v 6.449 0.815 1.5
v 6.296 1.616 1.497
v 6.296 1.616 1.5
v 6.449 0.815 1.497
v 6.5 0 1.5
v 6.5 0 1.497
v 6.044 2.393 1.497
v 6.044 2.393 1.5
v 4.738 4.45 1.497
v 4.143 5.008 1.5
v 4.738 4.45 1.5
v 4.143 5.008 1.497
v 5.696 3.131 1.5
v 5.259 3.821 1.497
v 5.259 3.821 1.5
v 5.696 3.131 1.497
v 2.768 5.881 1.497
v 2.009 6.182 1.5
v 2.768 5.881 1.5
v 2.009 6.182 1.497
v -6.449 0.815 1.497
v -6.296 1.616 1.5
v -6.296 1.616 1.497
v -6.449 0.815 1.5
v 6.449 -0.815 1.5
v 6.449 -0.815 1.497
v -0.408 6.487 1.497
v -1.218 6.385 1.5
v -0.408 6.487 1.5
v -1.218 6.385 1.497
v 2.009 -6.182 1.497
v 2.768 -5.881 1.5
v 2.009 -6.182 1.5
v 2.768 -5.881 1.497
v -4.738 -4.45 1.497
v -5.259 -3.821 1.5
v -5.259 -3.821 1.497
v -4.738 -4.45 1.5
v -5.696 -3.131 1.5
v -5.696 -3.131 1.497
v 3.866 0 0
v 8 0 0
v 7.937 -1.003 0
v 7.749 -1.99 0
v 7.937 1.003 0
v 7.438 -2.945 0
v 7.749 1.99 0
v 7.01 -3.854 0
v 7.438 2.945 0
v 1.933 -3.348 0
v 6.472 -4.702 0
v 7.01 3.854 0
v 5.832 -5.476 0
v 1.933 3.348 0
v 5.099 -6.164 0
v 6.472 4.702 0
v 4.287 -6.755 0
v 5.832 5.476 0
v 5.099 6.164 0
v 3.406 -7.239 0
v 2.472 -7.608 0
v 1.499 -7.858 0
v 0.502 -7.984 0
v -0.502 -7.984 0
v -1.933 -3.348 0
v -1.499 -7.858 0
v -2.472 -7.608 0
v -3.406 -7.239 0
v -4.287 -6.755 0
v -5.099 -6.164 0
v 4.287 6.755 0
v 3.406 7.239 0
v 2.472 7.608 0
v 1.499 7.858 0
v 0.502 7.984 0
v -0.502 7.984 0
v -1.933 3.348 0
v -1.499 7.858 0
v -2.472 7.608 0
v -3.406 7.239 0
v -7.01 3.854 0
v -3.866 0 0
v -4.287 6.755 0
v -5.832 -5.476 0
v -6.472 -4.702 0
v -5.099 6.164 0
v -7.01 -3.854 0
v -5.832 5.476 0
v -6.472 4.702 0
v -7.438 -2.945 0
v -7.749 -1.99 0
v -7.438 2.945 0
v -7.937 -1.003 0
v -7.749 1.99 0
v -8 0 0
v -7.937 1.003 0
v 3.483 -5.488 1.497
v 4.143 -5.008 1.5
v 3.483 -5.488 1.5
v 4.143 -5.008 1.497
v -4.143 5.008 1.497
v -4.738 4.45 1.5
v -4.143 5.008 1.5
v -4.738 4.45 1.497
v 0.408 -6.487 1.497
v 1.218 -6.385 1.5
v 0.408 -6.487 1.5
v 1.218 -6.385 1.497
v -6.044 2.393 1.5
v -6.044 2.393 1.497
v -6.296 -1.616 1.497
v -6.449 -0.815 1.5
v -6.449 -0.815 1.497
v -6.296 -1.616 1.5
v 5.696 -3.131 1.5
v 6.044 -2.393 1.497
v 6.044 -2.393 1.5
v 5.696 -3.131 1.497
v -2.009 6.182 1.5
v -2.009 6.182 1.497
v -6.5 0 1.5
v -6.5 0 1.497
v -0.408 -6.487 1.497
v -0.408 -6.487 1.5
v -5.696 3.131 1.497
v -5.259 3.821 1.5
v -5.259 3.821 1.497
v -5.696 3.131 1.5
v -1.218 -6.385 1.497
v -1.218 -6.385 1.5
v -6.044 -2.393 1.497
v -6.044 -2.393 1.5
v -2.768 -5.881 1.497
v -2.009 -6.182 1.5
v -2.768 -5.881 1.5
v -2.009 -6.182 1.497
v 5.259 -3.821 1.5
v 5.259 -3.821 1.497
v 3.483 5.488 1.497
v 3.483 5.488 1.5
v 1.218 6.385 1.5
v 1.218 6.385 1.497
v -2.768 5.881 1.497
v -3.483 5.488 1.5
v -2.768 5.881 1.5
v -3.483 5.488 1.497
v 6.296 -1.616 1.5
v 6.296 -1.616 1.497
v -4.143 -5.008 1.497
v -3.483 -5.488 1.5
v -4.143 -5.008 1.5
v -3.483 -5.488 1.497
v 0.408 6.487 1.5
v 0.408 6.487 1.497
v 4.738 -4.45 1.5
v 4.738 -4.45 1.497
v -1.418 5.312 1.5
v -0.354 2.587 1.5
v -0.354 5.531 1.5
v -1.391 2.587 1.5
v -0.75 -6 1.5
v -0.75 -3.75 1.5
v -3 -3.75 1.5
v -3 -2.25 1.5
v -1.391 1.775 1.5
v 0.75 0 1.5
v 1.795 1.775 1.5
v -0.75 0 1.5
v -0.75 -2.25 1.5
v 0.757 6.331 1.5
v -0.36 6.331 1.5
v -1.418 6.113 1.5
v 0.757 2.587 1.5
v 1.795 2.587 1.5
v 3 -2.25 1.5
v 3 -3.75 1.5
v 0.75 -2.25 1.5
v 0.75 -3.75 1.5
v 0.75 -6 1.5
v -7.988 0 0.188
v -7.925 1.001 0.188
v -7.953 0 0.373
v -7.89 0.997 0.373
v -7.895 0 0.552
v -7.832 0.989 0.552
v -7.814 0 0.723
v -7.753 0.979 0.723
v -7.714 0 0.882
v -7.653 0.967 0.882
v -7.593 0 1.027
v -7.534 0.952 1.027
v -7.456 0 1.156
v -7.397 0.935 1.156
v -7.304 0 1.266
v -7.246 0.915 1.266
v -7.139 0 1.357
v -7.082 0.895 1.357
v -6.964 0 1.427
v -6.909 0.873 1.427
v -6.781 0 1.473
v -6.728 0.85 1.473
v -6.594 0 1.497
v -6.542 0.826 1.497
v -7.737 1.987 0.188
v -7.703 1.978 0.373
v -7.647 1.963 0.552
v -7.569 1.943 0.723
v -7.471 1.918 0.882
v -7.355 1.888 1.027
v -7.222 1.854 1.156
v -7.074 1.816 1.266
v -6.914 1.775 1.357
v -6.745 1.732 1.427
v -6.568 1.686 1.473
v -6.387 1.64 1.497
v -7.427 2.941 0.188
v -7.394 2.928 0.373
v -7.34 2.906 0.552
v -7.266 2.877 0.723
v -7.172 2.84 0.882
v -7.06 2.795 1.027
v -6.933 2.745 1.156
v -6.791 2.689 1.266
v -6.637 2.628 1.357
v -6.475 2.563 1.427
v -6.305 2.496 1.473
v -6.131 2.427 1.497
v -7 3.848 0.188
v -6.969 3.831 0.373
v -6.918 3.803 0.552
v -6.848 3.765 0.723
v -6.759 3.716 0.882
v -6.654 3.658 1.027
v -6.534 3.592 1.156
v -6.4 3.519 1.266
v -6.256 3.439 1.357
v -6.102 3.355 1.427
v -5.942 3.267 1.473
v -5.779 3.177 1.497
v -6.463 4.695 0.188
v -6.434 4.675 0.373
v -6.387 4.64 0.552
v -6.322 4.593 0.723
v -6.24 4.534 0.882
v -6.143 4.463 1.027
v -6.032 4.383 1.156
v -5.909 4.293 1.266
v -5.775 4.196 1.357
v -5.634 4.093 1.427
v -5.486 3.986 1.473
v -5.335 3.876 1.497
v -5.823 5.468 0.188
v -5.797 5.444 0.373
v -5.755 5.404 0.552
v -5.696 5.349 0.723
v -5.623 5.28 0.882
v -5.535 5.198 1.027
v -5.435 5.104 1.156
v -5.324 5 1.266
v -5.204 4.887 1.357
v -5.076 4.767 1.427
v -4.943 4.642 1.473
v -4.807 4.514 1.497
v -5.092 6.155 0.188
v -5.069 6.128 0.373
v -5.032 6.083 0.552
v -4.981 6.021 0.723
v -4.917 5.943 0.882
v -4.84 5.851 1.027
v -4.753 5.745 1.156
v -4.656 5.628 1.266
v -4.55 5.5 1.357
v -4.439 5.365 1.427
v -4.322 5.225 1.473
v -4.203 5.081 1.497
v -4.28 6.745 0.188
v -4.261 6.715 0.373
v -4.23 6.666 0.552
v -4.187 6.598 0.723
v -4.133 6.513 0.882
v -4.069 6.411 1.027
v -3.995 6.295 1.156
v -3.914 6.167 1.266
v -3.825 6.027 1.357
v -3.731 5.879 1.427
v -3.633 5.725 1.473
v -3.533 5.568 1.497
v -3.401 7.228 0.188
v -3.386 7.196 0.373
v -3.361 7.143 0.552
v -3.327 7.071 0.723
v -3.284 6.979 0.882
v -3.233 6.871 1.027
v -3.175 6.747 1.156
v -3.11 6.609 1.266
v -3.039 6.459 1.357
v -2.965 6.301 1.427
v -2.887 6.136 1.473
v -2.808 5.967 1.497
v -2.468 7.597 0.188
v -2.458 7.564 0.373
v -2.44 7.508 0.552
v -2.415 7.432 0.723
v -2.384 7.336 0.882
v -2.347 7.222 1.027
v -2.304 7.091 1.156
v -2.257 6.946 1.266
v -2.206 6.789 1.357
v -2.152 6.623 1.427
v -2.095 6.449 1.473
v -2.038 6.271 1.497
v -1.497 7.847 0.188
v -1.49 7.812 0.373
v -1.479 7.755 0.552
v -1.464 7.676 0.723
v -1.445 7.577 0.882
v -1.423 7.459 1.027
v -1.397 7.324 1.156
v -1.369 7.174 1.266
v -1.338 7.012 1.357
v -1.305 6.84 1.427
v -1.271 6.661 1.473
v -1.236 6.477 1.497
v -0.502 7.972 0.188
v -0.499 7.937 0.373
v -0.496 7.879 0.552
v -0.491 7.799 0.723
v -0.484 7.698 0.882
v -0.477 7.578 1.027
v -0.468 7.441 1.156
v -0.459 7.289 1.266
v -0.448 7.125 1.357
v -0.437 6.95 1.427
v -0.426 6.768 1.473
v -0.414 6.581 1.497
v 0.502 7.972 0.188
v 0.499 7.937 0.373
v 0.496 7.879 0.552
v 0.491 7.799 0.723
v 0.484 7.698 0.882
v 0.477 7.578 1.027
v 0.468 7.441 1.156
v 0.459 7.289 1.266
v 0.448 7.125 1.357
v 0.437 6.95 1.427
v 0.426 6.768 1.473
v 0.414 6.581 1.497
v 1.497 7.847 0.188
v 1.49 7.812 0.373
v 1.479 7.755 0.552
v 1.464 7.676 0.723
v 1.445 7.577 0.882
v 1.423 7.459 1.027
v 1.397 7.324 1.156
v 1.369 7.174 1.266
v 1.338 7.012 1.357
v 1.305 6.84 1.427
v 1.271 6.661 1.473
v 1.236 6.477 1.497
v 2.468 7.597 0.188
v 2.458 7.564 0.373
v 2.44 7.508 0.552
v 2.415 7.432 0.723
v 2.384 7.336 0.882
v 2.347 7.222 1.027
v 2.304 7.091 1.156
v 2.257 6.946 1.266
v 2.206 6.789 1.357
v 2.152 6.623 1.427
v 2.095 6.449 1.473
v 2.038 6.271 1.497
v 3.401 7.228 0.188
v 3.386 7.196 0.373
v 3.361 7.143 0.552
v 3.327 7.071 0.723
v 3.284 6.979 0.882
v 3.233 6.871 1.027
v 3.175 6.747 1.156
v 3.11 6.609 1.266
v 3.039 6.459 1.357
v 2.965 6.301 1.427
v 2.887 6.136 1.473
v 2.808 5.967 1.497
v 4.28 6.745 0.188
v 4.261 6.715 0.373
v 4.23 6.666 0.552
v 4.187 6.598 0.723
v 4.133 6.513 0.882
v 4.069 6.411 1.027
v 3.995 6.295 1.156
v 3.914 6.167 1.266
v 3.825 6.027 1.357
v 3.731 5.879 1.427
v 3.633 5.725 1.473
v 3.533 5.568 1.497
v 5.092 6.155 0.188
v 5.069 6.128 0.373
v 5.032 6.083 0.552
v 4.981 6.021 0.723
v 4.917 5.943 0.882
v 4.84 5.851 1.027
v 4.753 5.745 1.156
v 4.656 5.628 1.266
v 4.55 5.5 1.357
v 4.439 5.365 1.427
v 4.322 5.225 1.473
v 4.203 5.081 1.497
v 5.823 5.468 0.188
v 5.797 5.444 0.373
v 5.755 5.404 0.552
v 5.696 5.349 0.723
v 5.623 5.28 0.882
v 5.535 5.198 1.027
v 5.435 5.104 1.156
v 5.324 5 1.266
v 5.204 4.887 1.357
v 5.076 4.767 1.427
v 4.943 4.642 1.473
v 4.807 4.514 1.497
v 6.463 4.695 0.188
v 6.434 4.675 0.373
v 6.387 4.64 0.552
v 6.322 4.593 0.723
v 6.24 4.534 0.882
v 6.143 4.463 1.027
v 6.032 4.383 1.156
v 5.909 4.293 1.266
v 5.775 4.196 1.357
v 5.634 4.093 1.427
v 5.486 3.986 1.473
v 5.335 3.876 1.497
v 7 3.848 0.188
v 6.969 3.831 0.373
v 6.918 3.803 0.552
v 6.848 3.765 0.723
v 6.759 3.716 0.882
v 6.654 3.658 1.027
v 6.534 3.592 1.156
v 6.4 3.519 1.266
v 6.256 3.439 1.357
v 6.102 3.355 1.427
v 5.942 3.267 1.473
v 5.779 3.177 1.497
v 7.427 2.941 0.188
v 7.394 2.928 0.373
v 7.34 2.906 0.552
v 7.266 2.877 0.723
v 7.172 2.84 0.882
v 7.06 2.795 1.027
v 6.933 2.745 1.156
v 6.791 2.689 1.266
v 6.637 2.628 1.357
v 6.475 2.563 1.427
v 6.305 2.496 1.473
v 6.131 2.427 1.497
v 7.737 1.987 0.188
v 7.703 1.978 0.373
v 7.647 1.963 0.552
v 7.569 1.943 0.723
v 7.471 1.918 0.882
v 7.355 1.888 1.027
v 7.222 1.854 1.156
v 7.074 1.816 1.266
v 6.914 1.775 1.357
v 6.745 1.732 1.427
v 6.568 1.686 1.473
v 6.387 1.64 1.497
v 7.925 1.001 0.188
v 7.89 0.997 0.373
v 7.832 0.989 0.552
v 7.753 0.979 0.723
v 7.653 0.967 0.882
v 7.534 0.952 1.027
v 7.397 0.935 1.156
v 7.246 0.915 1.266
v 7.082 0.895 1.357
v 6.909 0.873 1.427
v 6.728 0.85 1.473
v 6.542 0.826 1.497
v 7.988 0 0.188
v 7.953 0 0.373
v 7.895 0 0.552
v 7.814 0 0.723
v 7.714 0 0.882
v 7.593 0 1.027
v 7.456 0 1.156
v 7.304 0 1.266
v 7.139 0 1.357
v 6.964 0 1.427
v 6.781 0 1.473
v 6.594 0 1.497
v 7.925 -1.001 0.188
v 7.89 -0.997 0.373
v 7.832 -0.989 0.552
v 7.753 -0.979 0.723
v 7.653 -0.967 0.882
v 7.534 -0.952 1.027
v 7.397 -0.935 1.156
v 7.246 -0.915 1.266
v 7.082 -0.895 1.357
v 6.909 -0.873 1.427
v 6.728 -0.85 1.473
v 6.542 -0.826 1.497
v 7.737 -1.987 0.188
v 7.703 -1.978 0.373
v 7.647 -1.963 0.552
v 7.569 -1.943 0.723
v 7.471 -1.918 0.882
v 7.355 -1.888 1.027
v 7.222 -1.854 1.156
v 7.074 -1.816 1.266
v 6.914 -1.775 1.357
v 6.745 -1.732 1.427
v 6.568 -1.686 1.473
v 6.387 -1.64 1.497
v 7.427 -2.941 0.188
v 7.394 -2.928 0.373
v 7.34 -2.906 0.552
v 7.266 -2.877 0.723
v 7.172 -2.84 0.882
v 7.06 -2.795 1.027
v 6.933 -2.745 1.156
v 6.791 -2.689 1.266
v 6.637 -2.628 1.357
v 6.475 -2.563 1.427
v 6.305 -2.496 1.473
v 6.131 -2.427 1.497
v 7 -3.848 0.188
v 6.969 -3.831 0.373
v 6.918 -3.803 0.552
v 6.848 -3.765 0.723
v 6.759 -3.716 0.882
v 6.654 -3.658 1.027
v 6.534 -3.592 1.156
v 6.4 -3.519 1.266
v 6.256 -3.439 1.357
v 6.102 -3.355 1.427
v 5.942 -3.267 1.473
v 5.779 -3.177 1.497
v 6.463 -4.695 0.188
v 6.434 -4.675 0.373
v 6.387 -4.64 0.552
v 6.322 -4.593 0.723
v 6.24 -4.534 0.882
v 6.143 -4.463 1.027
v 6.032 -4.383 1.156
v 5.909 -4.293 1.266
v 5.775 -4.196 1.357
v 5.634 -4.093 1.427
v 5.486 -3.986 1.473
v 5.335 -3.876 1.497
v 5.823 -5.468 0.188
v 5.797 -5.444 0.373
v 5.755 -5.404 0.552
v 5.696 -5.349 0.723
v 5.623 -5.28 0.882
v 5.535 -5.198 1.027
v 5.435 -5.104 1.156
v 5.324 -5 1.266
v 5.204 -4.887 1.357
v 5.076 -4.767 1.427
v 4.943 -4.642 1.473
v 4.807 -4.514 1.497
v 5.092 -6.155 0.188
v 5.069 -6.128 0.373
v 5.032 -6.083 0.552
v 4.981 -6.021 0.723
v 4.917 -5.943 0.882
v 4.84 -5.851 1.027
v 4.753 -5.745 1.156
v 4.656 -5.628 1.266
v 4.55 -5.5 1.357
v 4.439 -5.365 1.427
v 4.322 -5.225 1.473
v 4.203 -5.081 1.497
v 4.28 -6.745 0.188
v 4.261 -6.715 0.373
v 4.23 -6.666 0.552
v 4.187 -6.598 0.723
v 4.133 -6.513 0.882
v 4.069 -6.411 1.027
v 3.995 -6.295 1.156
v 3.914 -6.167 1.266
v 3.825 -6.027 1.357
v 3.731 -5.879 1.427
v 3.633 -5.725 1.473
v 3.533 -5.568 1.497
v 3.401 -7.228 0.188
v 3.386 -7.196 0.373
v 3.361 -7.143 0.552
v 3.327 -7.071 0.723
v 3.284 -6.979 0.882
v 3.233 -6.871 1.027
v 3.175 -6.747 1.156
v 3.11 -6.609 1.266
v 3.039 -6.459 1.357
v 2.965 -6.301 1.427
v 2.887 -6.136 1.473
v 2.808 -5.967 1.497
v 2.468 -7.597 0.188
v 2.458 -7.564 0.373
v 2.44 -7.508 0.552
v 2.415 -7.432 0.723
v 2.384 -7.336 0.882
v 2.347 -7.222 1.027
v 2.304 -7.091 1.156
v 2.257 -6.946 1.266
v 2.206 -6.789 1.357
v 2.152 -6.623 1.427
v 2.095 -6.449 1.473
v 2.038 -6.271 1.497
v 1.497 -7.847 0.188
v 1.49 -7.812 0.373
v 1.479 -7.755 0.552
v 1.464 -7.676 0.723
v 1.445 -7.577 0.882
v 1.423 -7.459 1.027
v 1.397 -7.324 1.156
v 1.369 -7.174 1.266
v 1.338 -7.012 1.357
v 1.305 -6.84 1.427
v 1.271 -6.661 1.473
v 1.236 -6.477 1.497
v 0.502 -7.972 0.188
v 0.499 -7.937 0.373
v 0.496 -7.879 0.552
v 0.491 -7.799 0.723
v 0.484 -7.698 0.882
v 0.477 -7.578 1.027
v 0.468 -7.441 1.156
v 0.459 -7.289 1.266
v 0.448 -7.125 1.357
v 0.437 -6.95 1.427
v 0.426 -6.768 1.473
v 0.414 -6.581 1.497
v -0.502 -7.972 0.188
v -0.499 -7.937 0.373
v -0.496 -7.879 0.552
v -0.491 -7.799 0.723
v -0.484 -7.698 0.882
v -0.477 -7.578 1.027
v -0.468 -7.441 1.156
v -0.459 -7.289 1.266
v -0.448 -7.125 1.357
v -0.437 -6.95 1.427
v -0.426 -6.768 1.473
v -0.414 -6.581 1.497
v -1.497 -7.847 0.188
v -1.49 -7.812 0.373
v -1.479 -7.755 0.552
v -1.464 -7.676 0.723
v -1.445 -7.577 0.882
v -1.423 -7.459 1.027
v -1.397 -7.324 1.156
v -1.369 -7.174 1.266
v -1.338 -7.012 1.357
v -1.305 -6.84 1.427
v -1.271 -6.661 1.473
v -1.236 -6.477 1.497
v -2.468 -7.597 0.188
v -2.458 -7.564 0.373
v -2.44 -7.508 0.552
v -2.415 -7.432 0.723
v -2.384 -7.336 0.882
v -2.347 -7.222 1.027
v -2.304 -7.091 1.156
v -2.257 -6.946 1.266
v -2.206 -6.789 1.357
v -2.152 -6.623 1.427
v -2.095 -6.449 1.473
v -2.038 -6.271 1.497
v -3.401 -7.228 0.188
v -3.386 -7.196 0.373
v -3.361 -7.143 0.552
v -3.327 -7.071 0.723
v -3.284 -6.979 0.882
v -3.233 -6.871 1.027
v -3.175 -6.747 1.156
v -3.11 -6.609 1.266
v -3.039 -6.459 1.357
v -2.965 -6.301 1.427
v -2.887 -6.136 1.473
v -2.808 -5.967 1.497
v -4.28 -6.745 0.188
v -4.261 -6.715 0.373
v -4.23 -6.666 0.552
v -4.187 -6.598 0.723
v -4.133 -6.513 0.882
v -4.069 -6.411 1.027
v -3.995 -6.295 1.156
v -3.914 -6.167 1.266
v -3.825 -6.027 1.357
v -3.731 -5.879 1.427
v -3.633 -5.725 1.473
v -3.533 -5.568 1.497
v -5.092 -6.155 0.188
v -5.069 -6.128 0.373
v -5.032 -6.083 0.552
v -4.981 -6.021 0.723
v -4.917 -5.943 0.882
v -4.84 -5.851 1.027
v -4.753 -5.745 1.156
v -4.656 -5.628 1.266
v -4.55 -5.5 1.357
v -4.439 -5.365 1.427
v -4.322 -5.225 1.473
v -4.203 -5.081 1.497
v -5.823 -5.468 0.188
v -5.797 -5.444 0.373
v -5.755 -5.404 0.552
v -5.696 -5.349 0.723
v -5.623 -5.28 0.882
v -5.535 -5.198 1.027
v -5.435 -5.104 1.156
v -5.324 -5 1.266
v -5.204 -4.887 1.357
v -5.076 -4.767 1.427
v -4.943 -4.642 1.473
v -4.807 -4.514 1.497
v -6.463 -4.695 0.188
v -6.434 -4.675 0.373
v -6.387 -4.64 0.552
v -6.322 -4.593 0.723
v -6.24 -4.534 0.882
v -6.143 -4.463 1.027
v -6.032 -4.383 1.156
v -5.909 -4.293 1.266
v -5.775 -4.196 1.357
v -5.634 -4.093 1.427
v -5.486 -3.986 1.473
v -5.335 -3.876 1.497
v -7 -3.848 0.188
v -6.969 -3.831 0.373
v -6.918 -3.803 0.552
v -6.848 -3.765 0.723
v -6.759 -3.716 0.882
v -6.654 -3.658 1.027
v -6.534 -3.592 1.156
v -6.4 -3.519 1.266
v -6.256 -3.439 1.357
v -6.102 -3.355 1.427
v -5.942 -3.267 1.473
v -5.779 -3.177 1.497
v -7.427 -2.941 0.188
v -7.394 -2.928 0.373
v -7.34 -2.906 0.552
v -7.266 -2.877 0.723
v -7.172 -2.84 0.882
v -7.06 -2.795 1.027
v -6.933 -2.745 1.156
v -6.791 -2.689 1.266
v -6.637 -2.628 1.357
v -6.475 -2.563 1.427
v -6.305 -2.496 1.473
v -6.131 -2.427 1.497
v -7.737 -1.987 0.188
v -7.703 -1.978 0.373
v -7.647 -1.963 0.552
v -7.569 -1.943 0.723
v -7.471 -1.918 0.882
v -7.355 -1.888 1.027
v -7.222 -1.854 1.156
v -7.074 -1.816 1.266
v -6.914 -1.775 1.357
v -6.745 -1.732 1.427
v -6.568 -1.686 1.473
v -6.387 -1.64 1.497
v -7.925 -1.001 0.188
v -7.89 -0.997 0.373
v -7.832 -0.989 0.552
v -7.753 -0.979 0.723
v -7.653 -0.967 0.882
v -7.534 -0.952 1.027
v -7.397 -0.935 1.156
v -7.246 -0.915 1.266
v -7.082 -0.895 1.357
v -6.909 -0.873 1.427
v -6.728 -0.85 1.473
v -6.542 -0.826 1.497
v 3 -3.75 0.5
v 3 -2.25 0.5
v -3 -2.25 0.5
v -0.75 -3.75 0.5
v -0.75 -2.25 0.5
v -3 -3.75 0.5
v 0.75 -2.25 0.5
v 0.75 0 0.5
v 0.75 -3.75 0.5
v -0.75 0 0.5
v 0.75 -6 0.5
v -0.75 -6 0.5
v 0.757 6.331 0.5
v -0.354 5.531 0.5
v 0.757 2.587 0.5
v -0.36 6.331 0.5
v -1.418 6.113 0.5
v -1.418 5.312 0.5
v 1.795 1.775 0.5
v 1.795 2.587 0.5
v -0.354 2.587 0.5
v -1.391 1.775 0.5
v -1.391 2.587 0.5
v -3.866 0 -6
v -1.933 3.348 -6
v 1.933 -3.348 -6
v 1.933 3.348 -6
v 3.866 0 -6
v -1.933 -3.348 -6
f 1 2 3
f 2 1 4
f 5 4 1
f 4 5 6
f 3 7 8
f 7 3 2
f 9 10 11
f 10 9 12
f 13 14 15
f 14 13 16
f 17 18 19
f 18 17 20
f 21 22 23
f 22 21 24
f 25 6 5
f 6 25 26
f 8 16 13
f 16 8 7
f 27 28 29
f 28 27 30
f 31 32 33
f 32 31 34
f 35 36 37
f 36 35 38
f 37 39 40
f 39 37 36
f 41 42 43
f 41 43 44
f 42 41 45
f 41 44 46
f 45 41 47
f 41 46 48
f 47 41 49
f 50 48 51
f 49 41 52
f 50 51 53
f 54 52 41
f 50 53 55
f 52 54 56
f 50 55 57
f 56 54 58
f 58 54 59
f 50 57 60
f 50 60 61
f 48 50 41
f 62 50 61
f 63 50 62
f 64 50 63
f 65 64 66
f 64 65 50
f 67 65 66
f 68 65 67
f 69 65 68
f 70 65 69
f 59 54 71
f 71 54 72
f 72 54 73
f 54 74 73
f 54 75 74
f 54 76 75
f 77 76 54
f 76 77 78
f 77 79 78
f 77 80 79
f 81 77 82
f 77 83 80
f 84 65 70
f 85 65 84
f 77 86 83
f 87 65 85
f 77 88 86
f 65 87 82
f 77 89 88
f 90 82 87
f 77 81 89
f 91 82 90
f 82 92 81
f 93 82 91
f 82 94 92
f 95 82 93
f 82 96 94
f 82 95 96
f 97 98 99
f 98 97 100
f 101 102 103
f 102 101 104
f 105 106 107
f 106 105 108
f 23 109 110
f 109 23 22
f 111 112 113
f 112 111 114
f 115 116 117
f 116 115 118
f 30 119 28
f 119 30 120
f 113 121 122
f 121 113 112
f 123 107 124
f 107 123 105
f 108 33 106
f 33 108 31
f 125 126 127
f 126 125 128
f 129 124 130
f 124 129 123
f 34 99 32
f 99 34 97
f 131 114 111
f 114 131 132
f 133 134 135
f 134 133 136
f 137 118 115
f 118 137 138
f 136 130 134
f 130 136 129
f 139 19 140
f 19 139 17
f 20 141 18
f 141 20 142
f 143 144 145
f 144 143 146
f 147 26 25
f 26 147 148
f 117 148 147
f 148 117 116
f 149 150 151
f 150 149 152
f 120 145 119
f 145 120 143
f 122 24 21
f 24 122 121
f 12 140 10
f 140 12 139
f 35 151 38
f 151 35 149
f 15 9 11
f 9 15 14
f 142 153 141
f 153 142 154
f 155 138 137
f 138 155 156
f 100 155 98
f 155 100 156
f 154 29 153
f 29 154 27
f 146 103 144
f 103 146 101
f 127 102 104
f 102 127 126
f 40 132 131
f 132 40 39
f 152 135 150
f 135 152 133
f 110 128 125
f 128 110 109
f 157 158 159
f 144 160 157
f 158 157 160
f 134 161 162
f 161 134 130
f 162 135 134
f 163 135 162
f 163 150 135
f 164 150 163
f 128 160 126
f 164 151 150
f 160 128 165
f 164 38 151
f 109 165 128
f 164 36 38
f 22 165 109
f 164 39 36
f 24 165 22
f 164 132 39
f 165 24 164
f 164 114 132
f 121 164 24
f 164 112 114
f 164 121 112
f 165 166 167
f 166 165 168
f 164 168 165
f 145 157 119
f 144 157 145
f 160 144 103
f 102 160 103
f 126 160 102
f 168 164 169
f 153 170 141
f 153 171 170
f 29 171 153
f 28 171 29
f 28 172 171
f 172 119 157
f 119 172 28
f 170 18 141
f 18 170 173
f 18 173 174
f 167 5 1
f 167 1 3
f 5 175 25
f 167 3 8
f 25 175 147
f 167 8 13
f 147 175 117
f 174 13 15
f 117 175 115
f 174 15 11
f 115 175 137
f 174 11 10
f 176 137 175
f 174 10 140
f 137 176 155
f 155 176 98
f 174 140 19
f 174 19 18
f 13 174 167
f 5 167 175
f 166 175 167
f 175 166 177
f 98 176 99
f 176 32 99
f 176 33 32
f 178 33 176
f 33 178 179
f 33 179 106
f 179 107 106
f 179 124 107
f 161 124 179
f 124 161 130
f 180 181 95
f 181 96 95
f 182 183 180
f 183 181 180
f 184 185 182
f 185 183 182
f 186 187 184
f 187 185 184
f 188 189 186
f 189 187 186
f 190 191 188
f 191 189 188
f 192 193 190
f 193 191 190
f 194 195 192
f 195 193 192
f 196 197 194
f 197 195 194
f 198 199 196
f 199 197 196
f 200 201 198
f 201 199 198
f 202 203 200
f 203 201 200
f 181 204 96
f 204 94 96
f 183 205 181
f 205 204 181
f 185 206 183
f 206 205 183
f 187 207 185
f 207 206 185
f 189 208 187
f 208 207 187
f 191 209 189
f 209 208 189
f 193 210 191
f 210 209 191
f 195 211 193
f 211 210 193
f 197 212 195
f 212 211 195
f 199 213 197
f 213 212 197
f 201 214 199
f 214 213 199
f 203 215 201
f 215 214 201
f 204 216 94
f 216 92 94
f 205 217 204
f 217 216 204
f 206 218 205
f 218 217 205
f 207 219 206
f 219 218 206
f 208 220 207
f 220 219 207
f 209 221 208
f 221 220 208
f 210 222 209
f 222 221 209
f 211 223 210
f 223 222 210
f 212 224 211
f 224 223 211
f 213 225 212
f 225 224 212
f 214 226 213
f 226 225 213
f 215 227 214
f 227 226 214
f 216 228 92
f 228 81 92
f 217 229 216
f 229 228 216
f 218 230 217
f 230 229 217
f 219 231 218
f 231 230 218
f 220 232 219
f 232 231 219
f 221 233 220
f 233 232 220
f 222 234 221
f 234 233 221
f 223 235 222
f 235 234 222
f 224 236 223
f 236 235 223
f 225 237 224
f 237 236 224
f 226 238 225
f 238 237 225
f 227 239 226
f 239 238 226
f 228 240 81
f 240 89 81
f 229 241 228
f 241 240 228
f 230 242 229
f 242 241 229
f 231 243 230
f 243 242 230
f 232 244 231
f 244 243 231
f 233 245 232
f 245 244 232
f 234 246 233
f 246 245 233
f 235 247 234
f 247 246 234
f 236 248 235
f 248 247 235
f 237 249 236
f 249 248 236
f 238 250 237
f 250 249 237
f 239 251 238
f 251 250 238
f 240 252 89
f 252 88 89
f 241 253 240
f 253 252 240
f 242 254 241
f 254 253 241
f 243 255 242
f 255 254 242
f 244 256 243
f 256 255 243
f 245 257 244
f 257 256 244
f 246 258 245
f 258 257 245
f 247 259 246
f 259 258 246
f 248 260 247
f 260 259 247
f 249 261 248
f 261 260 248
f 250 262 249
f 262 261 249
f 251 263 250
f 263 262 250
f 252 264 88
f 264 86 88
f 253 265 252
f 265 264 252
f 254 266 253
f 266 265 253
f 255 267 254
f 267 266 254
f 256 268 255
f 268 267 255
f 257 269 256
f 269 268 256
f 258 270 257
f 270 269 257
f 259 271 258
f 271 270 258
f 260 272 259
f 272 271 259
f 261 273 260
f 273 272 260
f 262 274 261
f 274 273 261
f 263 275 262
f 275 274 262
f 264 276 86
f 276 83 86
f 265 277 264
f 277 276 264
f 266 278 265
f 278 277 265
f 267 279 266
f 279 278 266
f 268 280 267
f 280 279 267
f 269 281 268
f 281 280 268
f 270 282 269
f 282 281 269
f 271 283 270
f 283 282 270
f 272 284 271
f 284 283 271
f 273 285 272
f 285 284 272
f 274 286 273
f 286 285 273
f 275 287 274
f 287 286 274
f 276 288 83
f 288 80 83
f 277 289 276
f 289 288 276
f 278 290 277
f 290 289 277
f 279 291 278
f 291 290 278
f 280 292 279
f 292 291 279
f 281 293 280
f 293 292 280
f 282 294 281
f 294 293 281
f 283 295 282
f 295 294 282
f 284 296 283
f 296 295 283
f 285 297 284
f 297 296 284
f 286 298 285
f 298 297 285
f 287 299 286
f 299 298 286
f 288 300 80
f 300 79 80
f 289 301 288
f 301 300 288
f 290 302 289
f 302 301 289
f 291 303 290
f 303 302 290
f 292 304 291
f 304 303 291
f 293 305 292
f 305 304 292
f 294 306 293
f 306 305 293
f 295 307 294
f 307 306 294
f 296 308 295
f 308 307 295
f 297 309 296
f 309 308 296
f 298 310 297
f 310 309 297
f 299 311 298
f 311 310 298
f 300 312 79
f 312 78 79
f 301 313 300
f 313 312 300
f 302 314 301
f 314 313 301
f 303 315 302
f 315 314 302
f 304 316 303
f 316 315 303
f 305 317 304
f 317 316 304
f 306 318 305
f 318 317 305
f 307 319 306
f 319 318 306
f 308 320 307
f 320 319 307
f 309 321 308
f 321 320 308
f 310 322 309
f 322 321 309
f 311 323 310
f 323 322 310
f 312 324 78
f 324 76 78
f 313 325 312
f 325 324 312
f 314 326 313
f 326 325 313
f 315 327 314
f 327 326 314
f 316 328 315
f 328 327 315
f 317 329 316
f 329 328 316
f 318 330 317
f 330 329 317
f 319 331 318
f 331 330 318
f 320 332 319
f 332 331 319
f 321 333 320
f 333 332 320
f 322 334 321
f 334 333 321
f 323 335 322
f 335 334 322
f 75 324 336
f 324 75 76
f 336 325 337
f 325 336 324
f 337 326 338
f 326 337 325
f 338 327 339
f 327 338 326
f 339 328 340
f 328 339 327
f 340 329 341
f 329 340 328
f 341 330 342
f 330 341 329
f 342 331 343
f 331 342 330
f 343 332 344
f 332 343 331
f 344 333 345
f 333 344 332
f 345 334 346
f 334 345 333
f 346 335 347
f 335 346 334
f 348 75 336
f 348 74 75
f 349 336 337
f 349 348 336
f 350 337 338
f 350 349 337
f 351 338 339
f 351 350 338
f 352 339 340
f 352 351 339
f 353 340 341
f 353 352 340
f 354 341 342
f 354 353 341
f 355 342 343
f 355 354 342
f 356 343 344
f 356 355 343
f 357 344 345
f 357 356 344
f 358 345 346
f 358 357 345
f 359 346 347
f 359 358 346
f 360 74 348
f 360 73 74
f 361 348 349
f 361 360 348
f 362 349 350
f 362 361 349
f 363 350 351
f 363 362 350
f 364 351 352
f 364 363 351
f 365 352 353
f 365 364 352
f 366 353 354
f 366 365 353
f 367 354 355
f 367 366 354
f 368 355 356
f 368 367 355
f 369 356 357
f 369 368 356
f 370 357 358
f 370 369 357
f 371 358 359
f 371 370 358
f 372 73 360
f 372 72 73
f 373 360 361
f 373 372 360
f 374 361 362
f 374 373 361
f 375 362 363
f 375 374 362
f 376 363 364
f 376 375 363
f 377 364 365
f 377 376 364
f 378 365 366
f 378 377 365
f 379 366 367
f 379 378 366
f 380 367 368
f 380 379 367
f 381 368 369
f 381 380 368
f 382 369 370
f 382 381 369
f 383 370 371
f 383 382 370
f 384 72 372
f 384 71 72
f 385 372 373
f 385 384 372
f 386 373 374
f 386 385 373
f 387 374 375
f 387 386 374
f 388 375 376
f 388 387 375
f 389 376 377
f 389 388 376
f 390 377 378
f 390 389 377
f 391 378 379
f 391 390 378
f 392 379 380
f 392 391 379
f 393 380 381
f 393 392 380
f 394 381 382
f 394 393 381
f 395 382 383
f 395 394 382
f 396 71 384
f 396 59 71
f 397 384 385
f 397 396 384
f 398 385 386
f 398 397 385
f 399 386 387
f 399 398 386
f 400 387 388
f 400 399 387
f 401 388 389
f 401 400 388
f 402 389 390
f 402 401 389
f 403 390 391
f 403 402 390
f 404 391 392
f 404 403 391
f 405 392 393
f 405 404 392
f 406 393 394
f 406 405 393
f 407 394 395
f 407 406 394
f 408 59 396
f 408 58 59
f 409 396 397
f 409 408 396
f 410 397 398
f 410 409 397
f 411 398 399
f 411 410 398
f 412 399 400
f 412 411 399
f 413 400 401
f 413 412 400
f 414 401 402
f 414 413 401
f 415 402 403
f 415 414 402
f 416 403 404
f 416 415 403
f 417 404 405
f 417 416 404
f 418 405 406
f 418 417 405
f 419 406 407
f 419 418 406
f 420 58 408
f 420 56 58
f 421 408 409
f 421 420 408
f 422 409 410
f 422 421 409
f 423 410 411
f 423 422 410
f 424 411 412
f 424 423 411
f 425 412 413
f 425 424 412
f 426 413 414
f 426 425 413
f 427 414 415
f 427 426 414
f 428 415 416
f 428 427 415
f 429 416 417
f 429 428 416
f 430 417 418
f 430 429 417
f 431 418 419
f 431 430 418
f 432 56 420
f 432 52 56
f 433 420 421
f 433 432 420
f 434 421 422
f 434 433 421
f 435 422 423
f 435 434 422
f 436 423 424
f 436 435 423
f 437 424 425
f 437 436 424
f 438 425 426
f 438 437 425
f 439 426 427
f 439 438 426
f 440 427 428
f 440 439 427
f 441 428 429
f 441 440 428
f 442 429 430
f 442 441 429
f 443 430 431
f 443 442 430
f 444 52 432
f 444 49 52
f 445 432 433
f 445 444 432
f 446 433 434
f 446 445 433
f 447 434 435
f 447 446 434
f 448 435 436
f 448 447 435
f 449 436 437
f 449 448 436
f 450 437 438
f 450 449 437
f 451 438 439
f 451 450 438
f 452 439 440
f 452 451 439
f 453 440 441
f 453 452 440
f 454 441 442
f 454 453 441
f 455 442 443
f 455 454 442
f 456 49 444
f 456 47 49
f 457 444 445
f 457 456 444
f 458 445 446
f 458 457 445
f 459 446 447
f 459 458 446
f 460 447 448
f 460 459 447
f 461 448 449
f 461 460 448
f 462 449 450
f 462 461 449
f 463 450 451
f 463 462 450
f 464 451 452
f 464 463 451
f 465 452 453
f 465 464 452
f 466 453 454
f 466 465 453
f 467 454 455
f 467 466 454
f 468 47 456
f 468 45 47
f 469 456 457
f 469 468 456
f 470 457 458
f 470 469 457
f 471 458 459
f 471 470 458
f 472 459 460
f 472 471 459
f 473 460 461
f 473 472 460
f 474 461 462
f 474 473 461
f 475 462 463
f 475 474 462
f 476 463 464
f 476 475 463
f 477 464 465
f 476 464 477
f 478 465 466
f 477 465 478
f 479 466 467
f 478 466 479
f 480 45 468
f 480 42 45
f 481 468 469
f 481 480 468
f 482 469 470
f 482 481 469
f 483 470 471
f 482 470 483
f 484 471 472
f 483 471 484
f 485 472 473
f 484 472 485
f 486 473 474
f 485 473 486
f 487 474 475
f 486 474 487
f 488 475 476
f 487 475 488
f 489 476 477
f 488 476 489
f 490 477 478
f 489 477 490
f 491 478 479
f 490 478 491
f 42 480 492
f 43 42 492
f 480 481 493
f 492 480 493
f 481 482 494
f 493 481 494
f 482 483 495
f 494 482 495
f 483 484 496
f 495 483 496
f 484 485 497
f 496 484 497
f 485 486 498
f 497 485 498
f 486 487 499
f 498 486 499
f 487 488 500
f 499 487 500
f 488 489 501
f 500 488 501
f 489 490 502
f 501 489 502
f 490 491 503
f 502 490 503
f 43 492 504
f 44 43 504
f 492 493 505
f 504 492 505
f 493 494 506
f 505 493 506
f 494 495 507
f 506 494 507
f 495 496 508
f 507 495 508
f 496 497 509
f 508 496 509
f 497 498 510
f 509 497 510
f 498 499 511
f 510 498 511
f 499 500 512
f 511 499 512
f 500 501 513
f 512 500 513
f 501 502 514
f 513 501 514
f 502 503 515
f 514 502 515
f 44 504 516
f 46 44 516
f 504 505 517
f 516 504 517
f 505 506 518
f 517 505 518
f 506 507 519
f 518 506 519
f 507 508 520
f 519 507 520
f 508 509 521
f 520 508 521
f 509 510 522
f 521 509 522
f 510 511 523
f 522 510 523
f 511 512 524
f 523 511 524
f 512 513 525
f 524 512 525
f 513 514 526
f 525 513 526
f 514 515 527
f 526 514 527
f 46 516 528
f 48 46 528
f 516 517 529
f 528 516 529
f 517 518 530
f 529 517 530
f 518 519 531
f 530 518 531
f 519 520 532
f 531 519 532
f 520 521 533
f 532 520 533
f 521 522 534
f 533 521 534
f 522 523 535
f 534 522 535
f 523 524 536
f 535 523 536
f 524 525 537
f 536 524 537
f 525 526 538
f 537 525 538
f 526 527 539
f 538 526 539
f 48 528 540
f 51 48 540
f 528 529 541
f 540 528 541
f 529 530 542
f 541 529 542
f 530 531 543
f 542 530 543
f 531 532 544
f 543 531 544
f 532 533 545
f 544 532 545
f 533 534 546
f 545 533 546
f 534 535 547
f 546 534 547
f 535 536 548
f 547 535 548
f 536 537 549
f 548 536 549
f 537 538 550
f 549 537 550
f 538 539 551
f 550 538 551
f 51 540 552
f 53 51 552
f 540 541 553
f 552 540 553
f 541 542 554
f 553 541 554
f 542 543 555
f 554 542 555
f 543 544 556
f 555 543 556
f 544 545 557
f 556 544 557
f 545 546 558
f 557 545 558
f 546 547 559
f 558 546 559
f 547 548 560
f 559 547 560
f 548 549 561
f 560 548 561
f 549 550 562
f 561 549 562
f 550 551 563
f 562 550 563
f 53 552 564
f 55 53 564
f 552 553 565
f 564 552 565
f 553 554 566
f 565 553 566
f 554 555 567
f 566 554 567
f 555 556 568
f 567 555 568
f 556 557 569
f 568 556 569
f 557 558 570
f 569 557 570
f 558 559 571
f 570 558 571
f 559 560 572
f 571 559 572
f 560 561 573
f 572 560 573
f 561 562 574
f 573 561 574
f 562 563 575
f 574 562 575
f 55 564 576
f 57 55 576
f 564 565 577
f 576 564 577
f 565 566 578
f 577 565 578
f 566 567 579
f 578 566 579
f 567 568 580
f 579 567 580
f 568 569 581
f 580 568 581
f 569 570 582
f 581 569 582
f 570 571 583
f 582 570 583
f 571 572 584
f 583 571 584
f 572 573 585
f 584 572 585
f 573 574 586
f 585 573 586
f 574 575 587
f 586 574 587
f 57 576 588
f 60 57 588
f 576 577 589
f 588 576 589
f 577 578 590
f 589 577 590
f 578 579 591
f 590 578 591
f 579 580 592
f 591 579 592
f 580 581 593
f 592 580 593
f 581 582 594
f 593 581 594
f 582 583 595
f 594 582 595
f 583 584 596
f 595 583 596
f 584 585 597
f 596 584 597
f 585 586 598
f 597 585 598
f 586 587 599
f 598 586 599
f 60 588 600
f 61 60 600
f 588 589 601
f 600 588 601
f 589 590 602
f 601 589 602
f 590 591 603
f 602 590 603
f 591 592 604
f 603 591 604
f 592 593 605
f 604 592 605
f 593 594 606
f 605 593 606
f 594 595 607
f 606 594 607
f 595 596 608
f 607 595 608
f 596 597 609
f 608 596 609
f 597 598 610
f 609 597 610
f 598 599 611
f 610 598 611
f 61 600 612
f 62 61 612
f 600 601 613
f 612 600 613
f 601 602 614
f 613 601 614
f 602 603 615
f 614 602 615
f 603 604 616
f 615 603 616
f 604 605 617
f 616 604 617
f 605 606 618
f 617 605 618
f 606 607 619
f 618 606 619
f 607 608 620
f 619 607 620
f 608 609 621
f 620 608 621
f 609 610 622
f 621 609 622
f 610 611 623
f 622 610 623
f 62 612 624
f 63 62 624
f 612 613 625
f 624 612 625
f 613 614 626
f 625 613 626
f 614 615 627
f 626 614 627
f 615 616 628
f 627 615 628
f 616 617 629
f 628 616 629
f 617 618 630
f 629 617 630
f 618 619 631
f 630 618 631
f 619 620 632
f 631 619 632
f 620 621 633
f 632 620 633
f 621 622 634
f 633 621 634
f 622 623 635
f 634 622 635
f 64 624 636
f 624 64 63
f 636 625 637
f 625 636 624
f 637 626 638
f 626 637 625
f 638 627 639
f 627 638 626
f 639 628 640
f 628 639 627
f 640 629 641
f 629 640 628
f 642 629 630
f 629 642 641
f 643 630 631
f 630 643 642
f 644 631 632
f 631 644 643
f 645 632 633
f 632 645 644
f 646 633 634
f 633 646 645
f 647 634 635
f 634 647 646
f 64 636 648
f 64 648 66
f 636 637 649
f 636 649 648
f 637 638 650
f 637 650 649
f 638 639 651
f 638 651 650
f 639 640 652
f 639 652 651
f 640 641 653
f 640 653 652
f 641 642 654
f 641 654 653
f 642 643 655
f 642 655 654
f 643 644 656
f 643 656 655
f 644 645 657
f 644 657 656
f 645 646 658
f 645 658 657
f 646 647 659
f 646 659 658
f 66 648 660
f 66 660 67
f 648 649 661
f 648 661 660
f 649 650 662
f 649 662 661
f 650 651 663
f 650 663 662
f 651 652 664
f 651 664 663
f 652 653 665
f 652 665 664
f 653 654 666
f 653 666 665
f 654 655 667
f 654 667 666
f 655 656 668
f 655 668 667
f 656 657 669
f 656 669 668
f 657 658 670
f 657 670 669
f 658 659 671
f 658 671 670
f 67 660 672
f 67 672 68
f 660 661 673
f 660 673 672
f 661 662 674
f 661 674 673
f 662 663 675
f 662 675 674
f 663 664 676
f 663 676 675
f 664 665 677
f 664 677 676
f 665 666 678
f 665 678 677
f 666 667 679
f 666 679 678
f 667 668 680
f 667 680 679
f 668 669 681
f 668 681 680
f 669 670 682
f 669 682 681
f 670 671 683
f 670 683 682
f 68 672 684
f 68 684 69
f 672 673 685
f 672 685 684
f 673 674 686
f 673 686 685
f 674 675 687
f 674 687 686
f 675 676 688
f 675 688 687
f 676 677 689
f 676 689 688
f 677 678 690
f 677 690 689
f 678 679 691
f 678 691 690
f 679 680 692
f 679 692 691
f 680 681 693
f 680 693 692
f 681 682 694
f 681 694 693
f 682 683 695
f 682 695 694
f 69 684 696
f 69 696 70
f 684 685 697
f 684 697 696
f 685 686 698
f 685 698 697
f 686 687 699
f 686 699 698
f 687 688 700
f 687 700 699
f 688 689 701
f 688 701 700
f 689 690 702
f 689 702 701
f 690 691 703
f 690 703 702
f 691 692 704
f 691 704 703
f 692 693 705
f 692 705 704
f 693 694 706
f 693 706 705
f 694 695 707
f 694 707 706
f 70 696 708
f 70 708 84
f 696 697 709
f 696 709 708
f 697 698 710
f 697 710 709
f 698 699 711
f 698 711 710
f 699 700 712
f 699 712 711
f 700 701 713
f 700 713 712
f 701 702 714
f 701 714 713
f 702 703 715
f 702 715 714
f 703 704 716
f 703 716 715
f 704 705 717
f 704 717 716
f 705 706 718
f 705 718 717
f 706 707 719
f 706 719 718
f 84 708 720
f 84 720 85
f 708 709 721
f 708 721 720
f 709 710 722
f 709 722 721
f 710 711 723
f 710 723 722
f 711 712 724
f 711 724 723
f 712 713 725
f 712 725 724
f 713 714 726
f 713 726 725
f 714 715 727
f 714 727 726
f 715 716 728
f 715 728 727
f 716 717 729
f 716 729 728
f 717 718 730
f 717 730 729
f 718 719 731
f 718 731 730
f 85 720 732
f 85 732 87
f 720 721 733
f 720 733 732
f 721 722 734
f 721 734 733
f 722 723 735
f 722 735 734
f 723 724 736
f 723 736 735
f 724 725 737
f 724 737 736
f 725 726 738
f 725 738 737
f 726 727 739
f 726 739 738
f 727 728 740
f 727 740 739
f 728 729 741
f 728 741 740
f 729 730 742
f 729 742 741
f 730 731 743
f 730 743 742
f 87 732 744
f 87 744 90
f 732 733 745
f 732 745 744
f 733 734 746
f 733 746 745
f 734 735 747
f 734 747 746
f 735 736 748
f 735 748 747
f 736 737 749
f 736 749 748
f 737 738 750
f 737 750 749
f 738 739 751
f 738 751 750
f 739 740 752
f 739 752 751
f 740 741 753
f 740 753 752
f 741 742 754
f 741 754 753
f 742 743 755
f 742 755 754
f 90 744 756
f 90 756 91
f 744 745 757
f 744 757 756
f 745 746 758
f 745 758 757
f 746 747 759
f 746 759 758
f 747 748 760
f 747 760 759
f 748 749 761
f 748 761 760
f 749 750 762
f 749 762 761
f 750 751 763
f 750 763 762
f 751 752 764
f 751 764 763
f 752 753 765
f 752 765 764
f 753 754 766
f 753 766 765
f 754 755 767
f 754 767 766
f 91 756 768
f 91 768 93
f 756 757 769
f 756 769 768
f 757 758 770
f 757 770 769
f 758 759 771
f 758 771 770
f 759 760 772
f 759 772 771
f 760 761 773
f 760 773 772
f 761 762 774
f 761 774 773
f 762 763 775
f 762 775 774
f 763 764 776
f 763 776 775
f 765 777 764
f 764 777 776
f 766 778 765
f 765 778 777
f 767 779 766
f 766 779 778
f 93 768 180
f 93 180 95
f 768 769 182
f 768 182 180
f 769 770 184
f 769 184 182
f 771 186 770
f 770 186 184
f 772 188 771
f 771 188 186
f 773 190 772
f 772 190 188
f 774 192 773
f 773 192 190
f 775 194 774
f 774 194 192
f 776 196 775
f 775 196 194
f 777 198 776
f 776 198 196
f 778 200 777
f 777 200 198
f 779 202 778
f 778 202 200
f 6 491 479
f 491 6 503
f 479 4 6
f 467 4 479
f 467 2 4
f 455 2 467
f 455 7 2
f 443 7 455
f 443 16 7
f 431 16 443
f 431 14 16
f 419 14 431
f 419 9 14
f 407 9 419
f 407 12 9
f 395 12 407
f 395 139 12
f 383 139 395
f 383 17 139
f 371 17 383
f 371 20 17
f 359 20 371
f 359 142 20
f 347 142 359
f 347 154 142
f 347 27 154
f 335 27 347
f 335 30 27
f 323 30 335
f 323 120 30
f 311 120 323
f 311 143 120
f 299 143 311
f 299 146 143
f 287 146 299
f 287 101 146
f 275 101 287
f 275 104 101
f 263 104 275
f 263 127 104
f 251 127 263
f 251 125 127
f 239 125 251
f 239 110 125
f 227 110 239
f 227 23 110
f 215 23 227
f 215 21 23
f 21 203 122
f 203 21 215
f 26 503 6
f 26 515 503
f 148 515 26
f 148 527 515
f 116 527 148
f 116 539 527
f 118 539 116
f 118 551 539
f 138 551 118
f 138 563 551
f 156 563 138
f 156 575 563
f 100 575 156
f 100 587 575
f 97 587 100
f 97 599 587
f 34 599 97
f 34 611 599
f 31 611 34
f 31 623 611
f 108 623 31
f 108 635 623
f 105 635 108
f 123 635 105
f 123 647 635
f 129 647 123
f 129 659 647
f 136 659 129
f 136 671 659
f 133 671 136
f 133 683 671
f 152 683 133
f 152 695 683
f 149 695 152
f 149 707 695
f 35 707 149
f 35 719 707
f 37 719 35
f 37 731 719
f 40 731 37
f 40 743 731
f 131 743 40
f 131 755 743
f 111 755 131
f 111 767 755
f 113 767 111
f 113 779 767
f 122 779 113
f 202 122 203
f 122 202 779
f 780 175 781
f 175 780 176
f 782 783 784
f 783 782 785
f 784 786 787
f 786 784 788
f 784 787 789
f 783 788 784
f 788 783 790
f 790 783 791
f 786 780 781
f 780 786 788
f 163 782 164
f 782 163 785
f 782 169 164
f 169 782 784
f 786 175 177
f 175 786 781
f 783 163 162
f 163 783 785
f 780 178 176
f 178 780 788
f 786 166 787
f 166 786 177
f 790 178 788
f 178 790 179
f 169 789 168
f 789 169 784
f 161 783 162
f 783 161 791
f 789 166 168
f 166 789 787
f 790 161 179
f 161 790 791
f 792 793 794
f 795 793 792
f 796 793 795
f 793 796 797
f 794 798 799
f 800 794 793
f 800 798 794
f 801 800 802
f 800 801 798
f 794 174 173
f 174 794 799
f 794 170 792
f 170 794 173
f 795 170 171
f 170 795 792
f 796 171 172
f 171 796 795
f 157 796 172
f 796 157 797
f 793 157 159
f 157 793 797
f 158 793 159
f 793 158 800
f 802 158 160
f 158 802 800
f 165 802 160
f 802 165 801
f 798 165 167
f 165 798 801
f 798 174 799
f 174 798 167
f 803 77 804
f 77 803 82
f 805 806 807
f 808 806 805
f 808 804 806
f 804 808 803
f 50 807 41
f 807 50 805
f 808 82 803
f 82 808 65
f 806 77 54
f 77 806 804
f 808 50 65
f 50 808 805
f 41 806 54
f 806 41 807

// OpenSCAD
$fn = 50;


union() {
	difference() {
		union() {
			cylinder(h = 1.5000000000, r = 6.5000000000);
			rotate_extrude(angle = 360) {
				translate(v = [6.5000000000, 0, 0]) {
					circle(r = 1.5000000000);
				}
			}
		}
		union() {
			translate(v = [-25.0000000000, -25.0000000000, -50]) {
				cube(size = [50, 50, 50]);
			}
			#translate(v = [-3.0000000000, -3.7500000000, 0.5000000000]) {
				cube(size = [6, 1.5000000000, 1]);
			}
			#translate(v = [-0.7500000000, -6.0000000000, 0.5000000000]) {
				cube(size = [1.5000000000, 6, 1]);
			}
			#translate(v = [0, 4, 0.5000000000]) {
				linear_extrude(height = 1) {
					text(font = "SegoiUI:Bold", halign = "center", size = 4.5000000000, text = "1", valign = "center");
				}
			}
		}
	}
	union() {
		translate(v = [0, 0, -6]) {
			linear_extrude(height = 6) {
				polygon(points = [[3.8658550000, 0.0000000000], [1.9329275000, 3.3479286373], [-1.9329275000, 3.3479286373], [-3.8658550000, 0.0000000000], [-1.9329275000, -3.3479286373], [1.9329275000, -3.3479286373]]);
			}
		}
	}
}
